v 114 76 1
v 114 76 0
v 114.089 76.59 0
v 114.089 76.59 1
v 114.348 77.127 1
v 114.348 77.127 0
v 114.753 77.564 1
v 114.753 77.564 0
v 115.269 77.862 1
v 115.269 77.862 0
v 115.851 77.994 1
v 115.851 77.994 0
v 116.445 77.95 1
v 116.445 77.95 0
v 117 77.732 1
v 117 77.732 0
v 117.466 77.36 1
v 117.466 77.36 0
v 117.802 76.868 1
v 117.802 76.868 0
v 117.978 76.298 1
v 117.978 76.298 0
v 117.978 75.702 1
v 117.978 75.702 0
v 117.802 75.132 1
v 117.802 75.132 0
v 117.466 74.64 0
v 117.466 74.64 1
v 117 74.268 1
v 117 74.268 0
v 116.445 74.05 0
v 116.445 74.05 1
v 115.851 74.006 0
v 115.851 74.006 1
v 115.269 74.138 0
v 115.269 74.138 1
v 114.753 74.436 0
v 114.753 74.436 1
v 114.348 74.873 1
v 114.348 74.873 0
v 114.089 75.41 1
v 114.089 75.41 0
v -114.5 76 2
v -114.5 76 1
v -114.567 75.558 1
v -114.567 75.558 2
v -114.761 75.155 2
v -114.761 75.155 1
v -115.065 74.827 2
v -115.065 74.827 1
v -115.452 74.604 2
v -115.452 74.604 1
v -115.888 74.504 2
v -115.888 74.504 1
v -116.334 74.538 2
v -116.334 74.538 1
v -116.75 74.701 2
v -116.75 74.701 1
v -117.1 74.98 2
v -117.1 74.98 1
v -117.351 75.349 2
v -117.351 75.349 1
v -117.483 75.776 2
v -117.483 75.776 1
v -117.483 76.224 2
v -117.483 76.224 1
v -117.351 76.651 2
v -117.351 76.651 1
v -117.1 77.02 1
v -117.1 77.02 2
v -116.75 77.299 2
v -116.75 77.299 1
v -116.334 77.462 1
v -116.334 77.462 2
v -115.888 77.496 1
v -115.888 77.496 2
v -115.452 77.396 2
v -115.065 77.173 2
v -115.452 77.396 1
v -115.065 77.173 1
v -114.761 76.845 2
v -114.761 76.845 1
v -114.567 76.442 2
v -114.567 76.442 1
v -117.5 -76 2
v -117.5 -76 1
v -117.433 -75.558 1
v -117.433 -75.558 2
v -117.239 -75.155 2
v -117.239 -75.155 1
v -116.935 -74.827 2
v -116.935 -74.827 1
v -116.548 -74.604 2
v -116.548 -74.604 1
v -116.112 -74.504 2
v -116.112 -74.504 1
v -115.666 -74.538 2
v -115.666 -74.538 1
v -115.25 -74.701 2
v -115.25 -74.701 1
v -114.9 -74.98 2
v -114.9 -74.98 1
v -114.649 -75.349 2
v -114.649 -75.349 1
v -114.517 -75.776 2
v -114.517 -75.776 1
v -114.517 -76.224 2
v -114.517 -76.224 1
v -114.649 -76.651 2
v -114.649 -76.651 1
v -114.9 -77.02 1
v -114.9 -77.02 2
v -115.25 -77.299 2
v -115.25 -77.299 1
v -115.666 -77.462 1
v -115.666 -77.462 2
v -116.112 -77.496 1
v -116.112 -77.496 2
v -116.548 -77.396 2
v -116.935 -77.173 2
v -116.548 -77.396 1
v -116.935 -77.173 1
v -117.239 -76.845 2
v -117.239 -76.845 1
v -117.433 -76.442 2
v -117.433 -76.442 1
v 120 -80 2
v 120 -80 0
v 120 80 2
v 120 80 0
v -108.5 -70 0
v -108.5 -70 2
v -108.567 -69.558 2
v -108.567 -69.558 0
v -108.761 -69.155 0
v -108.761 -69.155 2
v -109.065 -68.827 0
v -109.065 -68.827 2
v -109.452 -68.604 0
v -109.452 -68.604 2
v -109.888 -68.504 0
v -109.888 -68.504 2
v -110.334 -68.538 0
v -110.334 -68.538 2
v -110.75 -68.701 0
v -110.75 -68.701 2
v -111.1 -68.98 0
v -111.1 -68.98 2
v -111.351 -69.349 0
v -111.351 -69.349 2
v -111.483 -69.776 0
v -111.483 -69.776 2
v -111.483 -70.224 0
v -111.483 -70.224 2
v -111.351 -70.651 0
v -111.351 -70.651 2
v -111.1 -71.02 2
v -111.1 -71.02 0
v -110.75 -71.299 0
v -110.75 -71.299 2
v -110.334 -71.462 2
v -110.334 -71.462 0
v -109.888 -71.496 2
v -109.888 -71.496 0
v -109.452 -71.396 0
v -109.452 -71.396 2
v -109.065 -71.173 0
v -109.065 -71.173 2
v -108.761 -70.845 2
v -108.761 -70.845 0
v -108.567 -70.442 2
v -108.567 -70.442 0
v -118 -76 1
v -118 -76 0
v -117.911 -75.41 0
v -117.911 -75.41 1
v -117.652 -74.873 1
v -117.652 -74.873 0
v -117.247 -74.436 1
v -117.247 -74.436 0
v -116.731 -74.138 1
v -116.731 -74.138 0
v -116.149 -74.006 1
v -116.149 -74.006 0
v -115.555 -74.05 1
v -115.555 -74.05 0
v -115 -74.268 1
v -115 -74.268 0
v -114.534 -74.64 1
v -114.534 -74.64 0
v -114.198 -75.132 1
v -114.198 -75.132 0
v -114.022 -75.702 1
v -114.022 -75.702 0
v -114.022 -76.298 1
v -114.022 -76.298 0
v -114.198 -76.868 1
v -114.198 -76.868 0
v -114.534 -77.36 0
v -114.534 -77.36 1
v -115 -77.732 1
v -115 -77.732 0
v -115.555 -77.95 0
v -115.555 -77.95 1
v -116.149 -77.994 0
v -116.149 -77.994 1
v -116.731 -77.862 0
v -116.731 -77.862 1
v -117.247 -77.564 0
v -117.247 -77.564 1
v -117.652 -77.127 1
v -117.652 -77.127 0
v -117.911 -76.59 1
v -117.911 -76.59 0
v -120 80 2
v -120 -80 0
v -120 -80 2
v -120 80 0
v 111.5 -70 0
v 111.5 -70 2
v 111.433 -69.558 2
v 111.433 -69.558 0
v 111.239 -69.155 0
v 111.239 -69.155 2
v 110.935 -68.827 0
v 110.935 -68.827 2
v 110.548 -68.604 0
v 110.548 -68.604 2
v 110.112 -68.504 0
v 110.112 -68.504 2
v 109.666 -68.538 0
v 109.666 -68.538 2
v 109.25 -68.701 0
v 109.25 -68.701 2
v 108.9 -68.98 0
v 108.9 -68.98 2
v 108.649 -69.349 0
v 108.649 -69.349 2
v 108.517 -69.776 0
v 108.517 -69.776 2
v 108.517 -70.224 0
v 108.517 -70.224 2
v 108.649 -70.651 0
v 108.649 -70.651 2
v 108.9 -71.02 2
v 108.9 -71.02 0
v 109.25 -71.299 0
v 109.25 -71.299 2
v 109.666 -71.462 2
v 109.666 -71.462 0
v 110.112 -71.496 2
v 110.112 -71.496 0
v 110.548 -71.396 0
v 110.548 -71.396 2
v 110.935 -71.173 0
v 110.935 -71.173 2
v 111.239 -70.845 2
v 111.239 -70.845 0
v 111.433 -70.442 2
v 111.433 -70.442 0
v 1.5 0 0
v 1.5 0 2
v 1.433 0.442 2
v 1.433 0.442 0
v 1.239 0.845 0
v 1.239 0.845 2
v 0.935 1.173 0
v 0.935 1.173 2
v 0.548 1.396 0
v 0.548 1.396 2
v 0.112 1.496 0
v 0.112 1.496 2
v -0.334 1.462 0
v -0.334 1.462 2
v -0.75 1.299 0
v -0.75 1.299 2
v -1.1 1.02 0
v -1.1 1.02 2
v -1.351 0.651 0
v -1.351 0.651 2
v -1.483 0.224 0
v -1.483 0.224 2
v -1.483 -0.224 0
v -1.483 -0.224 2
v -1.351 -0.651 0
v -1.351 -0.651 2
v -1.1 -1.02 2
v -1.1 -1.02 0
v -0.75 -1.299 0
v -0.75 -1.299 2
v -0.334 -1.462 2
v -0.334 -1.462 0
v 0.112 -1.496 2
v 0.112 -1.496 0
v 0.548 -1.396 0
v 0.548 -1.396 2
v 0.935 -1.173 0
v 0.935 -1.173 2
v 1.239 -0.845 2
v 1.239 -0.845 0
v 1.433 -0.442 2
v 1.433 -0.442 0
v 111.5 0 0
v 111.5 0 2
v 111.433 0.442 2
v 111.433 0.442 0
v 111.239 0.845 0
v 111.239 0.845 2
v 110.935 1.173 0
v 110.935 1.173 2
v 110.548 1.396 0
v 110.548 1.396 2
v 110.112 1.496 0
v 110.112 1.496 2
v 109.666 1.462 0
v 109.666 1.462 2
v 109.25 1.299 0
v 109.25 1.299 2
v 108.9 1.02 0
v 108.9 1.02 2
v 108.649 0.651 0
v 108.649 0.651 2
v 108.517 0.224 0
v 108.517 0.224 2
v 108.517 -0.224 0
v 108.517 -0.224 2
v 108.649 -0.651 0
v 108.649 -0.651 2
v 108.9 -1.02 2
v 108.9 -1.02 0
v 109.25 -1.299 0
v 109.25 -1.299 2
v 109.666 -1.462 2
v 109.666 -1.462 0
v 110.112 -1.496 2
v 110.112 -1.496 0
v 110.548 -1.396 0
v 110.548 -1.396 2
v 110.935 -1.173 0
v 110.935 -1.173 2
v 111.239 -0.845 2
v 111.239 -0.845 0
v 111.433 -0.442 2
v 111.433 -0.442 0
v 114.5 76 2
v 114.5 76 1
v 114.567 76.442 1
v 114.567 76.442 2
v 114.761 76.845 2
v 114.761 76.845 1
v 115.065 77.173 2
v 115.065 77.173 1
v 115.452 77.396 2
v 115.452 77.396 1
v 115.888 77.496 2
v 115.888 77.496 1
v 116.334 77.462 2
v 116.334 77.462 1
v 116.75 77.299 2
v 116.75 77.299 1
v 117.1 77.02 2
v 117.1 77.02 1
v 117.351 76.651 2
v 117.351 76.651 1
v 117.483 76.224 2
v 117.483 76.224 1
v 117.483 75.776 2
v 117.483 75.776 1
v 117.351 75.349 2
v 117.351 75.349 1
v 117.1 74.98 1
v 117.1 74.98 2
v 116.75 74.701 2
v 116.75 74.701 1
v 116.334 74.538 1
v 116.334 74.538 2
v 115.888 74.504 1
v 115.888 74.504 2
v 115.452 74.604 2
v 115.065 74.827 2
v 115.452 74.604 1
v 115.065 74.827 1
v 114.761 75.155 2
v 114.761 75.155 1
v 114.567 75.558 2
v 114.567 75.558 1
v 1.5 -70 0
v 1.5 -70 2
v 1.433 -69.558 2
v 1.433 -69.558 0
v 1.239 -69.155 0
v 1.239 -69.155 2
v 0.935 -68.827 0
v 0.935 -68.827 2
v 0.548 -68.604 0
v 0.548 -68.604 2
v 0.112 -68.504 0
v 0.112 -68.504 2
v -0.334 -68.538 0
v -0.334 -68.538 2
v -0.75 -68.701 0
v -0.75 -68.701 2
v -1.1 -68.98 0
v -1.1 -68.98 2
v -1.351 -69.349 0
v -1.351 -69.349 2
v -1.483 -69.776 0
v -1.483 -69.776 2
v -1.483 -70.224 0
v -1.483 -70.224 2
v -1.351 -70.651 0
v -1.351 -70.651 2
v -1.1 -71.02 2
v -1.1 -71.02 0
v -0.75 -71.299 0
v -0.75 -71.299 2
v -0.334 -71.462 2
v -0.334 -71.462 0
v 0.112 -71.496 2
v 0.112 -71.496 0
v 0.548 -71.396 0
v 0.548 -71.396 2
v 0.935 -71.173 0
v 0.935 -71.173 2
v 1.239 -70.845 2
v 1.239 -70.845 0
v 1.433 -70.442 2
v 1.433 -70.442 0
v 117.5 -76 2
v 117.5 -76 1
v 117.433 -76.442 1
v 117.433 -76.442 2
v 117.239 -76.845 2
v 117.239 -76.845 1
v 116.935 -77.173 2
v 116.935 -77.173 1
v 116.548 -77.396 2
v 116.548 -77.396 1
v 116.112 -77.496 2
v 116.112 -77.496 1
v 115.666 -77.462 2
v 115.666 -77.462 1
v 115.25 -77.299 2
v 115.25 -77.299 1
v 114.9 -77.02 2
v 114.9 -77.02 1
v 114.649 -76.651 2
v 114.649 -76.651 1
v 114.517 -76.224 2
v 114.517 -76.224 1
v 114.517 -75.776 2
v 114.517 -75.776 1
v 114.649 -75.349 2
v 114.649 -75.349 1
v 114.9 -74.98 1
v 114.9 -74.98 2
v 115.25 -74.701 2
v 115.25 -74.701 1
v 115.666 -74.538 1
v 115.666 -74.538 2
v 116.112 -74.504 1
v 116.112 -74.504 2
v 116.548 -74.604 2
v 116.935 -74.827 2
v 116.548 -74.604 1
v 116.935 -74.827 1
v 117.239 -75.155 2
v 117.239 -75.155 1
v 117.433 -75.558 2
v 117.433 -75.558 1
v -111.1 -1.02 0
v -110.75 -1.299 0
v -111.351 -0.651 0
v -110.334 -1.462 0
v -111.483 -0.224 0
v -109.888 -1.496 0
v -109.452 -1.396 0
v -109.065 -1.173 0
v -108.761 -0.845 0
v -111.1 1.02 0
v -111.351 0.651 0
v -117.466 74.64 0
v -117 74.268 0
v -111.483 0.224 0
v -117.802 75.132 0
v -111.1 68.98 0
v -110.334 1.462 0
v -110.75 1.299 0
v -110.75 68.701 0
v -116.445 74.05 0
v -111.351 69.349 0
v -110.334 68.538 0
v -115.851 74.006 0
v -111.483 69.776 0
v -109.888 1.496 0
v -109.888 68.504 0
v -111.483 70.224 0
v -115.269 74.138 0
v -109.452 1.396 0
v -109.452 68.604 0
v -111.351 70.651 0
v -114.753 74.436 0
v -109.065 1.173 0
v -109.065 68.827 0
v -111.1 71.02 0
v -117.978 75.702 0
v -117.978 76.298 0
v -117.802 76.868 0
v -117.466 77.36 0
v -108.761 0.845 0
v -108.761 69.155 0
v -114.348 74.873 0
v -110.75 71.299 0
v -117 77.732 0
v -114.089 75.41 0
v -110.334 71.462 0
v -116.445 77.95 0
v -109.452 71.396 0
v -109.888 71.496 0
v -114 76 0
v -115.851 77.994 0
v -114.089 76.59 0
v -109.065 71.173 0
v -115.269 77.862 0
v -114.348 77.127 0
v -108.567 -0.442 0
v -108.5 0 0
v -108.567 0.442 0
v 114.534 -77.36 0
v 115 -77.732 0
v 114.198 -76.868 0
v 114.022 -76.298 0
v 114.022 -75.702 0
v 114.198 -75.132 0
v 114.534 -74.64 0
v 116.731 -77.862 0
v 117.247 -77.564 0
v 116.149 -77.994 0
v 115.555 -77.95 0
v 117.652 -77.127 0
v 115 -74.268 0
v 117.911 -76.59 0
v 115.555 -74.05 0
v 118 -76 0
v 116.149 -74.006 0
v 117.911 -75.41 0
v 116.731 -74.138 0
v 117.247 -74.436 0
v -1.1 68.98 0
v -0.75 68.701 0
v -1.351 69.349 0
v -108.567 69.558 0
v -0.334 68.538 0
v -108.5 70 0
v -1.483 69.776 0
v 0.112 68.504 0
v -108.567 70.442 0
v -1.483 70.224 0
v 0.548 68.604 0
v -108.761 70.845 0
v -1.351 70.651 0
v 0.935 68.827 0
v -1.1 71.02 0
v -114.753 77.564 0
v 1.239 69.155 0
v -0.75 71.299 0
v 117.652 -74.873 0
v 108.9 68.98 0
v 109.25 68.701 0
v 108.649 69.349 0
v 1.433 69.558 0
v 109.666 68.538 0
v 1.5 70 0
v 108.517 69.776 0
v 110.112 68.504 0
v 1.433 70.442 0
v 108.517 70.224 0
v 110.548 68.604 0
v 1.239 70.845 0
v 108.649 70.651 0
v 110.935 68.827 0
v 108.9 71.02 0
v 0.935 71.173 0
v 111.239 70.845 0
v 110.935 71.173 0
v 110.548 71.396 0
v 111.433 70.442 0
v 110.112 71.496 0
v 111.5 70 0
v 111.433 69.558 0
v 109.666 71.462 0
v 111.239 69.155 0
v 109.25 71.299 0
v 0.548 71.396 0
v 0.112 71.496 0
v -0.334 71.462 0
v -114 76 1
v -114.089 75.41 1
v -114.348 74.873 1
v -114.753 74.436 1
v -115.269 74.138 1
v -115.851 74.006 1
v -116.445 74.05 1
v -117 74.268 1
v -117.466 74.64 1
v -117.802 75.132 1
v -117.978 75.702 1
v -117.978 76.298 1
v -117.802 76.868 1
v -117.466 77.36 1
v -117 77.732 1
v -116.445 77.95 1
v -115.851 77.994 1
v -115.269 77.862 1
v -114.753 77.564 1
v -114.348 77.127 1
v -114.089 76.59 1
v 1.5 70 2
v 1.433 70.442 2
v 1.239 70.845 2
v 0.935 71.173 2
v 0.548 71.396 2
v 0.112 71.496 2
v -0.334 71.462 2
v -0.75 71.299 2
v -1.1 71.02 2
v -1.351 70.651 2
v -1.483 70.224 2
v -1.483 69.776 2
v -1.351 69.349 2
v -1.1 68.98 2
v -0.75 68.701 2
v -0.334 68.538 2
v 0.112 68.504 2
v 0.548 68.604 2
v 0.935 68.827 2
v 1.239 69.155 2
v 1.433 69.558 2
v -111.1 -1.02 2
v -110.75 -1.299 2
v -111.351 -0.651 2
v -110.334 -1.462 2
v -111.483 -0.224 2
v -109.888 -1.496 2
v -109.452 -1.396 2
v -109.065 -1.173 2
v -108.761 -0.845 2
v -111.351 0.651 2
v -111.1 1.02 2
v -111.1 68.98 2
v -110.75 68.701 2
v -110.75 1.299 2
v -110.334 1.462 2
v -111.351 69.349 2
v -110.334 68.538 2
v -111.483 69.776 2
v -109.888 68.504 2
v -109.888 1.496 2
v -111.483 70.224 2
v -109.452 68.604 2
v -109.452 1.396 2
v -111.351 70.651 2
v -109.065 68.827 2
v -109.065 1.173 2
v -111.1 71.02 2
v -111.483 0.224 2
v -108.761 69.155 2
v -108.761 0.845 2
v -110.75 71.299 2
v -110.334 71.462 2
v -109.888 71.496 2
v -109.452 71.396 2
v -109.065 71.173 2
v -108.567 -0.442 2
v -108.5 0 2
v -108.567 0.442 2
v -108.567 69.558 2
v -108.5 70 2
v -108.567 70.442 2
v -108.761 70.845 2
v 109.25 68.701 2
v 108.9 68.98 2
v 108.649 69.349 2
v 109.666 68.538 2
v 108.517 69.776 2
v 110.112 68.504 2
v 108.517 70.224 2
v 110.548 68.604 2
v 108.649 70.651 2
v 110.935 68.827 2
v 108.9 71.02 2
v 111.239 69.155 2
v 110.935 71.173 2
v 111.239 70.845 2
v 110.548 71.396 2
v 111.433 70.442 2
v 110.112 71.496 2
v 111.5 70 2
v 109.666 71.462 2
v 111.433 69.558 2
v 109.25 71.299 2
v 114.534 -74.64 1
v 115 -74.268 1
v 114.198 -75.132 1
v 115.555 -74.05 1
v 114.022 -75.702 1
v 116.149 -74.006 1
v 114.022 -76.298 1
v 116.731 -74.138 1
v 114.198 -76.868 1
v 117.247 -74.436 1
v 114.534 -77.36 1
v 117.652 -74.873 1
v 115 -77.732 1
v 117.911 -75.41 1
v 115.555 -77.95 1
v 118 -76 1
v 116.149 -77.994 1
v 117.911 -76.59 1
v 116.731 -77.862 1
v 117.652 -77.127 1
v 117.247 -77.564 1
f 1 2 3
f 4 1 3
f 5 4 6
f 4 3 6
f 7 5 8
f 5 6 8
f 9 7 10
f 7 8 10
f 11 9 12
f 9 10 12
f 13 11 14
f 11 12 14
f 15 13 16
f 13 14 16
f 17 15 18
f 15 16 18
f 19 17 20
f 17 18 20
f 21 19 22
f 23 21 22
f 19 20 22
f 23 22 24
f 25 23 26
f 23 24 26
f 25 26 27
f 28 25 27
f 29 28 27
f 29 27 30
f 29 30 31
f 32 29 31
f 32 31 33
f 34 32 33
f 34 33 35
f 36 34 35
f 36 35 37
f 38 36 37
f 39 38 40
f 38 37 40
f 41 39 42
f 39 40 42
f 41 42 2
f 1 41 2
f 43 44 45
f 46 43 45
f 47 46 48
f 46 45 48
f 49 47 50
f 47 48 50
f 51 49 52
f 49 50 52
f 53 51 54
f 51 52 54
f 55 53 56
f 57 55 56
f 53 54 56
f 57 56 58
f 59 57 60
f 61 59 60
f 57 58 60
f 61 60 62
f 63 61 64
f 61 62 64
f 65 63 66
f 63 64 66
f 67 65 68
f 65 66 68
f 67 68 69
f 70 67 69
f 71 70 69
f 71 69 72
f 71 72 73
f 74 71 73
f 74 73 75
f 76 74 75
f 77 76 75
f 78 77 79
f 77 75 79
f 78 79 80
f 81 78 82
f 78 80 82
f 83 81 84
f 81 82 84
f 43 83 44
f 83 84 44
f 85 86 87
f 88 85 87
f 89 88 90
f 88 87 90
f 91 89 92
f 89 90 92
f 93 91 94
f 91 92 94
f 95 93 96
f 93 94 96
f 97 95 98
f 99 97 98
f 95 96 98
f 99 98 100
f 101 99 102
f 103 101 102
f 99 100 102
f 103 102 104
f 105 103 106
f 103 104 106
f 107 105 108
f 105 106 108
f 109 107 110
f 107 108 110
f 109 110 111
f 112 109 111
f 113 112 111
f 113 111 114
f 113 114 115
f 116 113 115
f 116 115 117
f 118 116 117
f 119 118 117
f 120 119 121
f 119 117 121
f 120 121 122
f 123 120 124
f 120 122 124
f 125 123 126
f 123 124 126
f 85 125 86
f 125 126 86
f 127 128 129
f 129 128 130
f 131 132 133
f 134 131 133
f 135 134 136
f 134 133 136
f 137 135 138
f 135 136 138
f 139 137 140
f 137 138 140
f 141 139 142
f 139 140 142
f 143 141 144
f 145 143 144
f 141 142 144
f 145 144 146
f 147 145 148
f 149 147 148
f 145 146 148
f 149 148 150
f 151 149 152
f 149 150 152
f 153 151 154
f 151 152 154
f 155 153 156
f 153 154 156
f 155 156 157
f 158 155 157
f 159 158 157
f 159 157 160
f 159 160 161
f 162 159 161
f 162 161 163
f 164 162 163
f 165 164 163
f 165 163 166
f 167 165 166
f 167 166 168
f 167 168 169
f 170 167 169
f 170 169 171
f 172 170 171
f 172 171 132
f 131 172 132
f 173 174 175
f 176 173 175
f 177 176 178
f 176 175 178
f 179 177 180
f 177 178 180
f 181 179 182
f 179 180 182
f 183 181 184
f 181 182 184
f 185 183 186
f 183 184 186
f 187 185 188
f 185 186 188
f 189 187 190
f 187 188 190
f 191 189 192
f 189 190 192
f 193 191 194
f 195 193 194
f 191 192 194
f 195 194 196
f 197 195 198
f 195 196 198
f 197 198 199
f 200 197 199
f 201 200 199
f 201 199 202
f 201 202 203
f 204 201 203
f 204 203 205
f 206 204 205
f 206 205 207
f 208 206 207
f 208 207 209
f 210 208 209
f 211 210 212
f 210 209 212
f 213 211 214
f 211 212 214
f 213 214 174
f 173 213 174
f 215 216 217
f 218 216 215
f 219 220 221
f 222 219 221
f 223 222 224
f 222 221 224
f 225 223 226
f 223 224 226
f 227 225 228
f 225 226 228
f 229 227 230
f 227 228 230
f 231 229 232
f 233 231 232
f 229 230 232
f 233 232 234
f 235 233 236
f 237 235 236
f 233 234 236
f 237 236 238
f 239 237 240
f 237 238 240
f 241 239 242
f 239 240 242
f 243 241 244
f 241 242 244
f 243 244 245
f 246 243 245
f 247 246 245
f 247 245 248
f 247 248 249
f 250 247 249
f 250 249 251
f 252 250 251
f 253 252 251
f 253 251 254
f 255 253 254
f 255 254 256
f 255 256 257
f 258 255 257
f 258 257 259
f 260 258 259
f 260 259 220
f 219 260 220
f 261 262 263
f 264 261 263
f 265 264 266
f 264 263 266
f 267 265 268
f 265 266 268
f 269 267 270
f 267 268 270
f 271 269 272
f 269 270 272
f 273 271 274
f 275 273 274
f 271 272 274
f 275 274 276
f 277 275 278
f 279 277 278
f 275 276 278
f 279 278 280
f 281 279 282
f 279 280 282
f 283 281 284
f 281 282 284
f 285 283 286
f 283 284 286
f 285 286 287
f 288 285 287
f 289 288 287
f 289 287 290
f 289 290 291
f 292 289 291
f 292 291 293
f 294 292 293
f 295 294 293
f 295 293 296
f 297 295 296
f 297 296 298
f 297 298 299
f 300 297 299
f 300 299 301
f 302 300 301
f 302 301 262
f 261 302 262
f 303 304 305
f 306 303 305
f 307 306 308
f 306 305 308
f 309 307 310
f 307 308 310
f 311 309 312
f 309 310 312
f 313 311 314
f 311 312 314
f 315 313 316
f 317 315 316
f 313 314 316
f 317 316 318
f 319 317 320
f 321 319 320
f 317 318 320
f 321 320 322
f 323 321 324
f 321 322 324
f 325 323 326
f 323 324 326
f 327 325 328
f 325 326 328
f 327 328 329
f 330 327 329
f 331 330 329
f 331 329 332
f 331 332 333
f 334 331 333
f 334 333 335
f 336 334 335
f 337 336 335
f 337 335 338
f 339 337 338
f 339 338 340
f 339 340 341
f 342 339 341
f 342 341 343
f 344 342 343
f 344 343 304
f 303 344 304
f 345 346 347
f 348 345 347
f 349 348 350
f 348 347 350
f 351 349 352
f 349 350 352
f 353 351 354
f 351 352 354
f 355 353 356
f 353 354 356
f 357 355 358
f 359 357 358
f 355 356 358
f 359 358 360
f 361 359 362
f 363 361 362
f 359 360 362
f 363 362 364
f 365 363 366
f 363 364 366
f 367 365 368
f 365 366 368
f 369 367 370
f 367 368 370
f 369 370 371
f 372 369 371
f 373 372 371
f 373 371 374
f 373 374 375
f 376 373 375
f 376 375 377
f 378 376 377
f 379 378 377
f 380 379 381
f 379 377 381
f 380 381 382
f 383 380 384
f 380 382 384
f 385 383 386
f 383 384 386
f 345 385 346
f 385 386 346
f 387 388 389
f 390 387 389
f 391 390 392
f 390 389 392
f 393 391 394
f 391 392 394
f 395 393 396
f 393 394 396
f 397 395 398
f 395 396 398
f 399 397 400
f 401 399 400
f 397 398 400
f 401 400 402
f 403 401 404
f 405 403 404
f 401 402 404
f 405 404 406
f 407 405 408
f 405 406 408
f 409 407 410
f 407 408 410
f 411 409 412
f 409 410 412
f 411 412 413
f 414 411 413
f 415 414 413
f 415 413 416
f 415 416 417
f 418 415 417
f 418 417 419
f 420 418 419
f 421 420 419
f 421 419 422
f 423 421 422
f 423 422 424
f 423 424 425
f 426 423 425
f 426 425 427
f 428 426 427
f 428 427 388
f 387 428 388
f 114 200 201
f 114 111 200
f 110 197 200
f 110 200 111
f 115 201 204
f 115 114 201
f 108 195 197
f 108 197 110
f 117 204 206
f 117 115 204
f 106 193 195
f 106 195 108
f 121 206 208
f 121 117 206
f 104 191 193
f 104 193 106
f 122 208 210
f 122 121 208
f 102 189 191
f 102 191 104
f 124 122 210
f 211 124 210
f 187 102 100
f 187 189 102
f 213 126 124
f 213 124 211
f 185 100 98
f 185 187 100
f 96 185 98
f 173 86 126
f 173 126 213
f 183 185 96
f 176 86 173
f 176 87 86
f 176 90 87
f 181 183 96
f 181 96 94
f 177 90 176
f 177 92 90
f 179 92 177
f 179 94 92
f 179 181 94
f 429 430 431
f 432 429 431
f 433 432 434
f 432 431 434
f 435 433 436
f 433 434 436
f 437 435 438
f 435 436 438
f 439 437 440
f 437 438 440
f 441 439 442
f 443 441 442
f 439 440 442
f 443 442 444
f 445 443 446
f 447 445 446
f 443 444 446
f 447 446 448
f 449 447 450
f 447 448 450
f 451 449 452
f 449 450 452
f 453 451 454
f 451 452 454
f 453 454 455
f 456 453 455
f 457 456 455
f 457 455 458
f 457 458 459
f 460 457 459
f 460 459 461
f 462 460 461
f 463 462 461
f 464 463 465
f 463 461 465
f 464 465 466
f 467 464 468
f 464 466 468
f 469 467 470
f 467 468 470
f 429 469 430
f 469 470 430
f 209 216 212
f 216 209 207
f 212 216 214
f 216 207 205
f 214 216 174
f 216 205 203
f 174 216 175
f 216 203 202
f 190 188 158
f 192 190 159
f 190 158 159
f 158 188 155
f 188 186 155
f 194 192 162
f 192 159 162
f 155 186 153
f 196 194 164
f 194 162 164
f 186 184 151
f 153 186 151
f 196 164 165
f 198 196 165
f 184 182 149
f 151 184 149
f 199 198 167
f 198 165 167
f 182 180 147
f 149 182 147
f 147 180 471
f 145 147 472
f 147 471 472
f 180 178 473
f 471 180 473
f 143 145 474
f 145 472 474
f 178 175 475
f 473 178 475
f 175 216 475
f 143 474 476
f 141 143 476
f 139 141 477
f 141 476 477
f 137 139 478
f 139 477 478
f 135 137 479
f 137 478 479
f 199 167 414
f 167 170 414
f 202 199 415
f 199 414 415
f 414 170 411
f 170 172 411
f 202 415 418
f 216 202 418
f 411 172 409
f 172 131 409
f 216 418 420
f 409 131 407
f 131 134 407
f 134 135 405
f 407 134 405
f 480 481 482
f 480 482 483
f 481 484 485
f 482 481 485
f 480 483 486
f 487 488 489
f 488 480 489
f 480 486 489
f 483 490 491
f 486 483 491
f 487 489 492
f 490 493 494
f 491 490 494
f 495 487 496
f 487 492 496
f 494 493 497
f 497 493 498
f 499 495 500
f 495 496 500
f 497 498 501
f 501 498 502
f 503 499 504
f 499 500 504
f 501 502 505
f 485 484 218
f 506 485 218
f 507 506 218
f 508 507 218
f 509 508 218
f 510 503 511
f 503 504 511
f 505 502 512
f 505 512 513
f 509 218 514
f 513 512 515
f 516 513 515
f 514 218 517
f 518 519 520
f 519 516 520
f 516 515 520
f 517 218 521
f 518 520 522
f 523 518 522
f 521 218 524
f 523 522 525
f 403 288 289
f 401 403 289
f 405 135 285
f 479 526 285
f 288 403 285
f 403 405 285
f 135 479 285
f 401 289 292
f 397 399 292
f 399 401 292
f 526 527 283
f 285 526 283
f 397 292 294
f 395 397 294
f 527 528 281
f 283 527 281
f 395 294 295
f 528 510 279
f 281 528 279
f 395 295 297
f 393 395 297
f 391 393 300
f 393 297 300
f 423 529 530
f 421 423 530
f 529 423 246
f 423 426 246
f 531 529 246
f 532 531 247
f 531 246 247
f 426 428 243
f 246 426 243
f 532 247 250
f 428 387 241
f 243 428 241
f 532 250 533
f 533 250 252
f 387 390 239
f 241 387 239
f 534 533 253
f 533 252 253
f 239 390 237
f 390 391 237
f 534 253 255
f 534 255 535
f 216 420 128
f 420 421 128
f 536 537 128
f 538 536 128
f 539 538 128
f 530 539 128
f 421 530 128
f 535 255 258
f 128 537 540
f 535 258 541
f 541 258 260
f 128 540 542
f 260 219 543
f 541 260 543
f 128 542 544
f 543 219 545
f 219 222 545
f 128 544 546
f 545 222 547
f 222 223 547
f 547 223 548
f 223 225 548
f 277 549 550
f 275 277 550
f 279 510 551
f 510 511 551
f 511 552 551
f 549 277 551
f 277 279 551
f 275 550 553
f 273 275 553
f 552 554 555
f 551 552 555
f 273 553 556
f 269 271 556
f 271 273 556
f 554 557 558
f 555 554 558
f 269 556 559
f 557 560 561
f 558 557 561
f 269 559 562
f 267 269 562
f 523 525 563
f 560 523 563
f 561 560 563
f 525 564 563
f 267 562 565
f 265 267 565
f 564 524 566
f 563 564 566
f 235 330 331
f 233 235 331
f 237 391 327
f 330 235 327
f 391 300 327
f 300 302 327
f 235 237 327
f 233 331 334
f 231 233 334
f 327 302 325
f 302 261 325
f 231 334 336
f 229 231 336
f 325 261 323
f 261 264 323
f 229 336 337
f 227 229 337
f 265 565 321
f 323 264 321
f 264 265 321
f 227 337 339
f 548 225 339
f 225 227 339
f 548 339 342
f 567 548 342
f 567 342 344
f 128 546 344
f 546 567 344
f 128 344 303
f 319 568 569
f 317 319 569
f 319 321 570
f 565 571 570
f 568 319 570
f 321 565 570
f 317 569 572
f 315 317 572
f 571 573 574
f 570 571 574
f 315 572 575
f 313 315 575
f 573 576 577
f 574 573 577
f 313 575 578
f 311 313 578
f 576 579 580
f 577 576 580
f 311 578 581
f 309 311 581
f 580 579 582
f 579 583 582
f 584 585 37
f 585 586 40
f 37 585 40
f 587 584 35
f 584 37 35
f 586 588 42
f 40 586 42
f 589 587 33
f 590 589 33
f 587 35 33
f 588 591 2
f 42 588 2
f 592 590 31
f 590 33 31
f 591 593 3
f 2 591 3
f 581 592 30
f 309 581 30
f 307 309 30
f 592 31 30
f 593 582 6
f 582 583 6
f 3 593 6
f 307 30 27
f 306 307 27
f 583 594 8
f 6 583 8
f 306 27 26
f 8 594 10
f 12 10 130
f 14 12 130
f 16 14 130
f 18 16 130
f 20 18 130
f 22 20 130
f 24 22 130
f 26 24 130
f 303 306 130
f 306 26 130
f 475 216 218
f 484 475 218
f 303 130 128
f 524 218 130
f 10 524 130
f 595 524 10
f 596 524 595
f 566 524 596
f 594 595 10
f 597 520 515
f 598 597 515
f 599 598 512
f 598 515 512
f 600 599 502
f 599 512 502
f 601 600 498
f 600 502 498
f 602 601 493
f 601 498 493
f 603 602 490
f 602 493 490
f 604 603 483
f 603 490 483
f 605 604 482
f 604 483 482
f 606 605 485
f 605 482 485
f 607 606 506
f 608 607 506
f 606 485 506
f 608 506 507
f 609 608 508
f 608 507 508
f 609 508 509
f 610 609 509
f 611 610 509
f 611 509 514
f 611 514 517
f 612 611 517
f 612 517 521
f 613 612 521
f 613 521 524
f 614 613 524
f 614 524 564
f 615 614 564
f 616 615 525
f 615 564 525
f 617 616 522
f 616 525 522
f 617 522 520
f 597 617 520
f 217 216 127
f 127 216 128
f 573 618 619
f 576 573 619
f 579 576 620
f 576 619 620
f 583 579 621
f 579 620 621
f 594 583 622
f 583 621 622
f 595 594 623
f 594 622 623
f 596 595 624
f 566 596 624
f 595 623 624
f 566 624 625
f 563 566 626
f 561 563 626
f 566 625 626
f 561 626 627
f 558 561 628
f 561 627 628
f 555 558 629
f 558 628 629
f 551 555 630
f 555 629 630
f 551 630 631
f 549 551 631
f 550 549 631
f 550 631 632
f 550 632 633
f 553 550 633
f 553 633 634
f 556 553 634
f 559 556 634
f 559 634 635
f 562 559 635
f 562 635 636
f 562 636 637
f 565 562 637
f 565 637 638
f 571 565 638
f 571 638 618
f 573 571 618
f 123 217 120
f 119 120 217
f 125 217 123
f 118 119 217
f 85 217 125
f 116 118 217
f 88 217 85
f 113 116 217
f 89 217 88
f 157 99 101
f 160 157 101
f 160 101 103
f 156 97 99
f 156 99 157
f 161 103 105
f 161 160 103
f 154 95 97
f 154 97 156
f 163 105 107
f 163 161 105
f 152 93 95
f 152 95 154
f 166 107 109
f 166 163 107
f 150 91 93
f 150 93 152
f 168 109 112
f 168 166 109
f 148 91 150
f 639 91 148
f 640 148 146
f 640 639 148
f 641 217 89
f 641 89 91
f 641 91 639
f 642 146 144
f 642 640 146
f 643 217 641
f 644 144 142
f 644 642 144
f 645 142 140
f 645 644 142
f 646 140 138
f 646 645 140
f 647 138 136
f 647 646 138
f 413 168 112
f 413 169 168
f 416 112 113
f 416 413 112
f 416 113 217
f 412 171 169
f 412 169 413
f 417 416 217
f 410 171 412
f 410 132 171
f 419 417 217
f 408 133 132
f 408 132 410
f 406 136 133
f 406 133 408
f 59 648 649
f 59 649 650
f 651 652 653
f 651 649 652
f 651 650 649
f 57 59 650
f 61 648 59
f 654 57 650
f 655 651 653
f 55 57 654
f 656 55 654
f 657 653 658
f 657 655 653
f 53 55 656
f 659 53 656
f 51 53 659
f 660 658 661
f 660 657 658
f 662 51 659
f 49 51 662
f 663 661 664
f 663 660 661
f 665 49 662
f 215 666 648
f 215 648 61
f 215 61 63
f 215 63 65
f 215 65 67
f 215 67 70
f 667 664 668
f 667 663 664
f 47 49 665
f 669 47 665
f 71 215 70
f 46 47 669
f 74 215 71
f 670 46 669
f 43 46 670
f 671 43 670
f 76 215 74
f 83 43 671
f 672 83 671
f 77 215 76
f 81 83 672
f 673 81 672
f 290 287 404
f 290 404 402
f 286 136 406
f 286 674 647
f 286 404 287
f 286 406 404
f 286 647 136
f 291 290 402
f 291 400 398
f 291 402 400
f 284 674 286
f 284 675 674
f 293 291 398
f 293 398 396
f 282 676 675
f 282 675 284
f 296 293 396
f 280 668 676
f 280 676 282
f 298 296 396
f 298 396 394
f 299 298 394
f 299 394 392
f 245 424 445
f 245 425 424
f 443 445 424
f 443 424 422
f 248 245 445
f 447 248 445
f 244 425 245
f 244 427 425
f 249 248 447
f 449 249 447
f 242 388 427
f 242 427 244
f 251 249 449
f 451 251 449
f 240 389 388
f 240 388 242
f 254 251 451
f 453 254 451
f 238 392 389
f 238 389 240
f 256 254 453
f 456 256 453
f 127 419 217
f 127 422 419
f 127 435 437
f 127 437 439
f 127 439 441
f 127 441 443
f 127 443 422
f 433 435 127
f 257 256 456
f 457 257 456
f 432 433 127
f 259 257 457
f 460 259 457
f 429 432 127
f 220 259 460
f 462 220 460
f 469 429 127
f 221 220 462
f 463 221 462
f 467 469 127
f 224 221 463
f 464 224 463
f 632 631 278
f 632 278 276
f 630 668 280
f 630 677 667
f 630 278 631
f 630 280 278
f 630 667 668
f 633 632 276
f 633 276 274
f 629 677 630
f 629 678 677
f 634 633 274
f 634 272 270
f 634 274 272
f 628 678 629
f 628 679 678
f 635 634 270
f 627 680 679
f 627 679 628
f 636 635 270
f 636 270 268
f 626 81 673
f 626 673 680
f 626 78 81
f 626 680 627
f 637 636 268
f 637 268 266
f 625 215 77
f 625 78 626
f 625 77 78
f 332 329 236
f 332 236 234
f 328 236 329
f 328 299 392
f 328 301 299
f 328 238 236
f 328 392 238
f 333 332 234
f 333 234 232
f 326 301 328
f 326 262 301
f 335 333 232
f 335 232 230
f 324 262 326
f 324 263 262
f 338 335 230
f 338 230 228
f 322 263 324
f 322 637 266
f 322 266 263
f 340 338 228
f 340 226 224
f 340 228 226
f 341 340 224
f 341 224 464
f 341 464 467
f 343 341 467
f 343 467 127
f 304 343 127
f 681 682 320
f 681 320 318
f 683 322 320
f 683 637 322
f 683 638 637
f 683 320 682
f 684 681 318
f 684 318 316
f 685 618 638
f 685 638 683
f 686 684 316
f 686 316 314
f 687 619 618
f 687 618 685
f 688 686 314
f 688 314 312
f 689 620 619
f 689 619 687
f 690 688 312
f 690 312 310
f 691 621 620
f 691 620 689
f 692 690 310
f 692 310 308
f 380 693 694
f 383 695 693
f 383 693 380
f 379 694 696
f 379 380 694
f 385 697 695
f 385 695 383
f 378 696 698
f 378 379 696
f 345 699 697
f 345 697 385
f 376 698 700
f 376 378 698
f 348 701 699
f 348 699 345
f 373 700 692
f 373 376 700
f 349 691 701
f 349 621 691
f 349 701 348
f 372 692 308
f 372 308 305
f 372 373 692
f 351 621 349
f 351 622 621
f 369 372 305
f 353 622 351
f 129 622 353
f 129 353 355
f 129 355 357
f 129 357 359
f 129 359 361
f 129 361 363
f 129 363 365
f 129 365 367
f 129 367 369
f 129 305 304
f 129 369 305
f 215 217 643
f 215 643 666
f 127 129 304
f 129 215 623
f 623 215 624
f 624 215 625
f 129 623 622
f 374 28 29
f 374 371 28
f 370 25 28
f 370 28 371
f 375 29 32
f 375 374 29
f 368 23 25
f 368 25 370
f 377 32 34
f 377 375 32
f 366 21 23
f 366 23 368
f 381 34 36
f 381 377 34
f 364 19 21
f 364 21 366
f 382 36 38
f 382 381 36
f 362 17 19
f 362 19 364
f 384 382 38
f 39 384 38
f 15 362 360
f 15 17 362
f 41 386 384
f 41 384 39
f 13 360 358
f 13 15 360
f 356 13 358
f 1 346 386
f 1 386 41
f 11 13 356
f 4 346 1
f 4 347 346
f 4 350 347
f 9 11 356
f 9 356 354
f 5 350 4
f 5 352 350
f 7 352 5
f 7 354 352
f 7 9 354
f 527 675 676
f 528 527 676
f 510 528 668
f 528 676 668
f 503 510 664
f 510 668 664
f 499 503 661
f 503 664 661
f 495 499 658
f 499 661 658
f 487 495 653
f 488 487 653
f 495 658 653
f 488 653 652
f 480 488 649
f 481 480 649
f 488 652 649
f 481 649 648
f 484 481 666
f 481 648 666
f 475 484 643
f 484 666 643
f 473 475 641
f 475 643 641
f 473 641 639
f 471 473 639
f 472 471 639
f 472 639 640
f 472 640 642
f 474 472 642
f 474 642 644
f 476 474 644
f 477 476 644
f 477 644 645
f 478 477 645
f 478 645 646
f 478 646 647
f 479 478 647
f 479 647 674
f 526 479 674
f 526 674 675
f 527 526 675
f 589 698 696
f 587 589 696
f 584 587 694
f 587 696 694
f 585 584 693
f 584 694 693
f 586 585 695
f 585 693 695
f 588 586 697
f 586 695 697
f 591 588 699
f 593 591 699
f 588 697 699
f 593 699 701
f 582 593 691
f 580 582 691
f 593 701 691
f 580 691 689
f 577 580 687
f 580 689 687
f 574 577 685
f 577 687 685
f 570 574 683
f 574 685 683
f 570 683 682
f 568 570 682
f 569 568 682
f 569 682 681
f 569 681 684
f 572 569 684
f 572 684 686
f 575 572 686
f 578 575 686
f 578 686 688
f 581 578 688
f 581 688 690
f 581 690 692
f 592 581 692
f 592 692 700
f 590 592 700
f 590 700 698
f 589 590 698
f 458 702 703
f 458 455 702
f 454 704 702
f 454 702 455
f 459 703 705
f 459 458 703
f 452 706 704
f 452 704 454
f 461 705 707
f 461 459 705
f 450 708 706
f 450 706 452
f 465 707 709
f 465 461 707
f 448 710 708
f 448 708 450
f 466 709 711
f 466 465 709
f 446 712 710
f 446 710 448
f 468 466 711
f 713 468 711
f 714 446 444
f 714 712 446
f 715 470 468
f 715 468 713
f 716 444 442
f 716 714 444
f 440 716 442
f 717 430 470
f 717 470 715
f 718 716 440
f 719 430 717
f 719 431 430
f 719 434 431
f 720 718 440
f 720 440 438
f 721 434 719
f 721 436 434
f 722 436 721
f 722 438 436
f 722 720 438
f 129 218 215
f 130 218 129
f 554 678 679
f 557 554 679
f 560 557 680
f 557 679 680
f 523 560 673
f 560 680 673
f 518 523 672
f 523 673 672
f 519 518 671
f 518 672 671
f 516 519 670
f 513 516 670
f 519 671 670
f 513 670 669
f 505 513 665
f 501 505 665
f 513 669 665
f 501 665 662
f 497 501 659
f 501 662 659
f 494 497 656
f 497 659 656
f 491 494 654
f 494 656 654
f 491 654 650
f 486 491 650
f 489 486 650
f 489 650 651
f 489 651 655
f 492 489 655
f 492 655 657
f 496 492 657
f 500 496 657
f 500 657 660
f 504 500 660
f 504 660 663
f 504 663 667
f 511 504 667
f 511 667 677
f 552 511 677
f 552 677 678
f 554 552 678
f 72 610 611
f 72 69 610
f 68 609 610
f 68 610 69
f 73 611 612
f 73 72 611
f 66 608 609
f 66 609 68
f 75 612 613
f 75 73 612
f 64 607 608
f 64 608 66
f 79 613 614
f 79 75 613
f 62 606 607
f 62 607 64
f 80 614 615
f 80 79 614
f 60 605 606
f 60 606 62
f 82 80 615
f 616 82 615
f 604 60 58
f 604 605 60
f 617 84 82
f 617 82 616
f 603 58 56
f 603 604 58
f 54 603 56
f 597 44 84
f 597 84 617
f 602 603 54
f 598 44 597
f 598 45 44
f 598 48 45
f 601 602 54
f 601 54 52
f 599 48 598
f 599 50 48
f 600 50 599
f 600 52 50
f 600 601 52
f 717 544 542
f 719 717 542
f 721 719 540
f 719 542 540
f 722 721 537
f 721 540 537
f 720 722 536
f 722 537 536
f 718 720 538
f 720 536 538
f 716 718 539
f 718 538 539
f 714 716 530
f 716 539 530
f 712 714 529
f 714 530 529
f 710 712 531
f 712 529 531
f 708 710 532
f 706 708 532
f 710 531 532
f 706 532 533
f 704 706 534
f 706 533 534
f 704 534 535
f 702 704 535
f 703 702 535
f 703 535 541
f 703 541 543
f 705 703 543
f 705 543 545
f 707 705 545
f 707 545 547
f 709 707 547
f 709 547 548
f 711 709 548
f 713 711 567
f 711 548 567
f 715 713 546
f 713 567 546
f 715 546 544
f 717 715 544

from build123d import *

# Parameters (mm, degrees)
SKETCH1_W           = 240
SKETCH1_H           = 160
BOSS_EXTRUDE1_DEPTH = 2
SKETCH5_R           = 1.5
CUT_EXTRUDE2_DEPTH  = 4
SKETCH6_R           = 2
CUT_EXTRUDE3_DEPTH  = 1
SKETCH7_R           = 1.5
CUT_EXTRUDE4_DEPTH  = 1


with BuildPart() as part:
    # Sketch1 → Boss-Extrude1 (new body)
    with BuildSketch(Plane.XY):
        Rectangle(SKETCH1_W, SKETCH1_H)
    extrude(amount=BOSS_EXTRUDE1_DEPTH)

    # Sketch5 → Cut-Extrude2 (cut)
    with BuildSketch(Plane.XY.offset(2)):
        with Locations((-110, 70)):
            Circle(SKETCH5_R)
        with Locations((0, 70)):
            Circle(SKETCH5_R)
        with Locations((110, 70)):
            Circle(SKETCH5_R)
        Circle(SKETCH5_R)
        with Locations((110, 0)):
            Circle(SKETCH5_R)
        with Locations((0, -70)):
            Circle(SKETCH5_R)
        with Locations((110, -70)):
            Circle(SKETCH5_R)
        with Locations((-110, 0)):
            Circle(SKETCH5_R)
        with Locations((-110, -70)):
            Circle(SKETCH5_R)
    extrude(amount=-CUT_EXTRUDE2_DEPTH, mode=Mode.SUBTRACT)

    # Sketch6 → Cut-Extrude3 (cut)
    with BuildSketch(Plane(origin=(0, 0, 0), x_dir=(-1, 0, 0), z_dir=(0, 0, -1))):
        with Locations((116, -76)):
            Circle(SKETCH6_R)
        with Locations((116, 76)):
            Circle(SKETCH6_R)
        with Locations((-116, 76)):
            Circle(SKETCH6_R)
        with Locations((-116, -76)):
            Circle(SKETCH6_R)
    extrude(amount=-CUT_EXTRUDE3_DEPTH, mode=Mode.SUBTRACT)

    # Sketch7 → Cut-Extrude4 (cut)
    with BuildSketch(Plane(origin=(0, 0, 1), x_dir=(-1, 0, 0), z_dir=(0, 0, -1))):
        with Locations((116, -76)):
            Circle(SKETCH7_R)
        with Locations((116, 76)):
            Circle(SKETCH7_R)
        with Locations((-116, 76)):
            Circle(SKETCH7_R)
        with Locations((-116, -76)):
            Circle(SKETCH7_R)
    extrude(amount=-CUT_EXTRUDE4_DEPTH, mode=Mode.SUBTRACT)


solid = part.part
